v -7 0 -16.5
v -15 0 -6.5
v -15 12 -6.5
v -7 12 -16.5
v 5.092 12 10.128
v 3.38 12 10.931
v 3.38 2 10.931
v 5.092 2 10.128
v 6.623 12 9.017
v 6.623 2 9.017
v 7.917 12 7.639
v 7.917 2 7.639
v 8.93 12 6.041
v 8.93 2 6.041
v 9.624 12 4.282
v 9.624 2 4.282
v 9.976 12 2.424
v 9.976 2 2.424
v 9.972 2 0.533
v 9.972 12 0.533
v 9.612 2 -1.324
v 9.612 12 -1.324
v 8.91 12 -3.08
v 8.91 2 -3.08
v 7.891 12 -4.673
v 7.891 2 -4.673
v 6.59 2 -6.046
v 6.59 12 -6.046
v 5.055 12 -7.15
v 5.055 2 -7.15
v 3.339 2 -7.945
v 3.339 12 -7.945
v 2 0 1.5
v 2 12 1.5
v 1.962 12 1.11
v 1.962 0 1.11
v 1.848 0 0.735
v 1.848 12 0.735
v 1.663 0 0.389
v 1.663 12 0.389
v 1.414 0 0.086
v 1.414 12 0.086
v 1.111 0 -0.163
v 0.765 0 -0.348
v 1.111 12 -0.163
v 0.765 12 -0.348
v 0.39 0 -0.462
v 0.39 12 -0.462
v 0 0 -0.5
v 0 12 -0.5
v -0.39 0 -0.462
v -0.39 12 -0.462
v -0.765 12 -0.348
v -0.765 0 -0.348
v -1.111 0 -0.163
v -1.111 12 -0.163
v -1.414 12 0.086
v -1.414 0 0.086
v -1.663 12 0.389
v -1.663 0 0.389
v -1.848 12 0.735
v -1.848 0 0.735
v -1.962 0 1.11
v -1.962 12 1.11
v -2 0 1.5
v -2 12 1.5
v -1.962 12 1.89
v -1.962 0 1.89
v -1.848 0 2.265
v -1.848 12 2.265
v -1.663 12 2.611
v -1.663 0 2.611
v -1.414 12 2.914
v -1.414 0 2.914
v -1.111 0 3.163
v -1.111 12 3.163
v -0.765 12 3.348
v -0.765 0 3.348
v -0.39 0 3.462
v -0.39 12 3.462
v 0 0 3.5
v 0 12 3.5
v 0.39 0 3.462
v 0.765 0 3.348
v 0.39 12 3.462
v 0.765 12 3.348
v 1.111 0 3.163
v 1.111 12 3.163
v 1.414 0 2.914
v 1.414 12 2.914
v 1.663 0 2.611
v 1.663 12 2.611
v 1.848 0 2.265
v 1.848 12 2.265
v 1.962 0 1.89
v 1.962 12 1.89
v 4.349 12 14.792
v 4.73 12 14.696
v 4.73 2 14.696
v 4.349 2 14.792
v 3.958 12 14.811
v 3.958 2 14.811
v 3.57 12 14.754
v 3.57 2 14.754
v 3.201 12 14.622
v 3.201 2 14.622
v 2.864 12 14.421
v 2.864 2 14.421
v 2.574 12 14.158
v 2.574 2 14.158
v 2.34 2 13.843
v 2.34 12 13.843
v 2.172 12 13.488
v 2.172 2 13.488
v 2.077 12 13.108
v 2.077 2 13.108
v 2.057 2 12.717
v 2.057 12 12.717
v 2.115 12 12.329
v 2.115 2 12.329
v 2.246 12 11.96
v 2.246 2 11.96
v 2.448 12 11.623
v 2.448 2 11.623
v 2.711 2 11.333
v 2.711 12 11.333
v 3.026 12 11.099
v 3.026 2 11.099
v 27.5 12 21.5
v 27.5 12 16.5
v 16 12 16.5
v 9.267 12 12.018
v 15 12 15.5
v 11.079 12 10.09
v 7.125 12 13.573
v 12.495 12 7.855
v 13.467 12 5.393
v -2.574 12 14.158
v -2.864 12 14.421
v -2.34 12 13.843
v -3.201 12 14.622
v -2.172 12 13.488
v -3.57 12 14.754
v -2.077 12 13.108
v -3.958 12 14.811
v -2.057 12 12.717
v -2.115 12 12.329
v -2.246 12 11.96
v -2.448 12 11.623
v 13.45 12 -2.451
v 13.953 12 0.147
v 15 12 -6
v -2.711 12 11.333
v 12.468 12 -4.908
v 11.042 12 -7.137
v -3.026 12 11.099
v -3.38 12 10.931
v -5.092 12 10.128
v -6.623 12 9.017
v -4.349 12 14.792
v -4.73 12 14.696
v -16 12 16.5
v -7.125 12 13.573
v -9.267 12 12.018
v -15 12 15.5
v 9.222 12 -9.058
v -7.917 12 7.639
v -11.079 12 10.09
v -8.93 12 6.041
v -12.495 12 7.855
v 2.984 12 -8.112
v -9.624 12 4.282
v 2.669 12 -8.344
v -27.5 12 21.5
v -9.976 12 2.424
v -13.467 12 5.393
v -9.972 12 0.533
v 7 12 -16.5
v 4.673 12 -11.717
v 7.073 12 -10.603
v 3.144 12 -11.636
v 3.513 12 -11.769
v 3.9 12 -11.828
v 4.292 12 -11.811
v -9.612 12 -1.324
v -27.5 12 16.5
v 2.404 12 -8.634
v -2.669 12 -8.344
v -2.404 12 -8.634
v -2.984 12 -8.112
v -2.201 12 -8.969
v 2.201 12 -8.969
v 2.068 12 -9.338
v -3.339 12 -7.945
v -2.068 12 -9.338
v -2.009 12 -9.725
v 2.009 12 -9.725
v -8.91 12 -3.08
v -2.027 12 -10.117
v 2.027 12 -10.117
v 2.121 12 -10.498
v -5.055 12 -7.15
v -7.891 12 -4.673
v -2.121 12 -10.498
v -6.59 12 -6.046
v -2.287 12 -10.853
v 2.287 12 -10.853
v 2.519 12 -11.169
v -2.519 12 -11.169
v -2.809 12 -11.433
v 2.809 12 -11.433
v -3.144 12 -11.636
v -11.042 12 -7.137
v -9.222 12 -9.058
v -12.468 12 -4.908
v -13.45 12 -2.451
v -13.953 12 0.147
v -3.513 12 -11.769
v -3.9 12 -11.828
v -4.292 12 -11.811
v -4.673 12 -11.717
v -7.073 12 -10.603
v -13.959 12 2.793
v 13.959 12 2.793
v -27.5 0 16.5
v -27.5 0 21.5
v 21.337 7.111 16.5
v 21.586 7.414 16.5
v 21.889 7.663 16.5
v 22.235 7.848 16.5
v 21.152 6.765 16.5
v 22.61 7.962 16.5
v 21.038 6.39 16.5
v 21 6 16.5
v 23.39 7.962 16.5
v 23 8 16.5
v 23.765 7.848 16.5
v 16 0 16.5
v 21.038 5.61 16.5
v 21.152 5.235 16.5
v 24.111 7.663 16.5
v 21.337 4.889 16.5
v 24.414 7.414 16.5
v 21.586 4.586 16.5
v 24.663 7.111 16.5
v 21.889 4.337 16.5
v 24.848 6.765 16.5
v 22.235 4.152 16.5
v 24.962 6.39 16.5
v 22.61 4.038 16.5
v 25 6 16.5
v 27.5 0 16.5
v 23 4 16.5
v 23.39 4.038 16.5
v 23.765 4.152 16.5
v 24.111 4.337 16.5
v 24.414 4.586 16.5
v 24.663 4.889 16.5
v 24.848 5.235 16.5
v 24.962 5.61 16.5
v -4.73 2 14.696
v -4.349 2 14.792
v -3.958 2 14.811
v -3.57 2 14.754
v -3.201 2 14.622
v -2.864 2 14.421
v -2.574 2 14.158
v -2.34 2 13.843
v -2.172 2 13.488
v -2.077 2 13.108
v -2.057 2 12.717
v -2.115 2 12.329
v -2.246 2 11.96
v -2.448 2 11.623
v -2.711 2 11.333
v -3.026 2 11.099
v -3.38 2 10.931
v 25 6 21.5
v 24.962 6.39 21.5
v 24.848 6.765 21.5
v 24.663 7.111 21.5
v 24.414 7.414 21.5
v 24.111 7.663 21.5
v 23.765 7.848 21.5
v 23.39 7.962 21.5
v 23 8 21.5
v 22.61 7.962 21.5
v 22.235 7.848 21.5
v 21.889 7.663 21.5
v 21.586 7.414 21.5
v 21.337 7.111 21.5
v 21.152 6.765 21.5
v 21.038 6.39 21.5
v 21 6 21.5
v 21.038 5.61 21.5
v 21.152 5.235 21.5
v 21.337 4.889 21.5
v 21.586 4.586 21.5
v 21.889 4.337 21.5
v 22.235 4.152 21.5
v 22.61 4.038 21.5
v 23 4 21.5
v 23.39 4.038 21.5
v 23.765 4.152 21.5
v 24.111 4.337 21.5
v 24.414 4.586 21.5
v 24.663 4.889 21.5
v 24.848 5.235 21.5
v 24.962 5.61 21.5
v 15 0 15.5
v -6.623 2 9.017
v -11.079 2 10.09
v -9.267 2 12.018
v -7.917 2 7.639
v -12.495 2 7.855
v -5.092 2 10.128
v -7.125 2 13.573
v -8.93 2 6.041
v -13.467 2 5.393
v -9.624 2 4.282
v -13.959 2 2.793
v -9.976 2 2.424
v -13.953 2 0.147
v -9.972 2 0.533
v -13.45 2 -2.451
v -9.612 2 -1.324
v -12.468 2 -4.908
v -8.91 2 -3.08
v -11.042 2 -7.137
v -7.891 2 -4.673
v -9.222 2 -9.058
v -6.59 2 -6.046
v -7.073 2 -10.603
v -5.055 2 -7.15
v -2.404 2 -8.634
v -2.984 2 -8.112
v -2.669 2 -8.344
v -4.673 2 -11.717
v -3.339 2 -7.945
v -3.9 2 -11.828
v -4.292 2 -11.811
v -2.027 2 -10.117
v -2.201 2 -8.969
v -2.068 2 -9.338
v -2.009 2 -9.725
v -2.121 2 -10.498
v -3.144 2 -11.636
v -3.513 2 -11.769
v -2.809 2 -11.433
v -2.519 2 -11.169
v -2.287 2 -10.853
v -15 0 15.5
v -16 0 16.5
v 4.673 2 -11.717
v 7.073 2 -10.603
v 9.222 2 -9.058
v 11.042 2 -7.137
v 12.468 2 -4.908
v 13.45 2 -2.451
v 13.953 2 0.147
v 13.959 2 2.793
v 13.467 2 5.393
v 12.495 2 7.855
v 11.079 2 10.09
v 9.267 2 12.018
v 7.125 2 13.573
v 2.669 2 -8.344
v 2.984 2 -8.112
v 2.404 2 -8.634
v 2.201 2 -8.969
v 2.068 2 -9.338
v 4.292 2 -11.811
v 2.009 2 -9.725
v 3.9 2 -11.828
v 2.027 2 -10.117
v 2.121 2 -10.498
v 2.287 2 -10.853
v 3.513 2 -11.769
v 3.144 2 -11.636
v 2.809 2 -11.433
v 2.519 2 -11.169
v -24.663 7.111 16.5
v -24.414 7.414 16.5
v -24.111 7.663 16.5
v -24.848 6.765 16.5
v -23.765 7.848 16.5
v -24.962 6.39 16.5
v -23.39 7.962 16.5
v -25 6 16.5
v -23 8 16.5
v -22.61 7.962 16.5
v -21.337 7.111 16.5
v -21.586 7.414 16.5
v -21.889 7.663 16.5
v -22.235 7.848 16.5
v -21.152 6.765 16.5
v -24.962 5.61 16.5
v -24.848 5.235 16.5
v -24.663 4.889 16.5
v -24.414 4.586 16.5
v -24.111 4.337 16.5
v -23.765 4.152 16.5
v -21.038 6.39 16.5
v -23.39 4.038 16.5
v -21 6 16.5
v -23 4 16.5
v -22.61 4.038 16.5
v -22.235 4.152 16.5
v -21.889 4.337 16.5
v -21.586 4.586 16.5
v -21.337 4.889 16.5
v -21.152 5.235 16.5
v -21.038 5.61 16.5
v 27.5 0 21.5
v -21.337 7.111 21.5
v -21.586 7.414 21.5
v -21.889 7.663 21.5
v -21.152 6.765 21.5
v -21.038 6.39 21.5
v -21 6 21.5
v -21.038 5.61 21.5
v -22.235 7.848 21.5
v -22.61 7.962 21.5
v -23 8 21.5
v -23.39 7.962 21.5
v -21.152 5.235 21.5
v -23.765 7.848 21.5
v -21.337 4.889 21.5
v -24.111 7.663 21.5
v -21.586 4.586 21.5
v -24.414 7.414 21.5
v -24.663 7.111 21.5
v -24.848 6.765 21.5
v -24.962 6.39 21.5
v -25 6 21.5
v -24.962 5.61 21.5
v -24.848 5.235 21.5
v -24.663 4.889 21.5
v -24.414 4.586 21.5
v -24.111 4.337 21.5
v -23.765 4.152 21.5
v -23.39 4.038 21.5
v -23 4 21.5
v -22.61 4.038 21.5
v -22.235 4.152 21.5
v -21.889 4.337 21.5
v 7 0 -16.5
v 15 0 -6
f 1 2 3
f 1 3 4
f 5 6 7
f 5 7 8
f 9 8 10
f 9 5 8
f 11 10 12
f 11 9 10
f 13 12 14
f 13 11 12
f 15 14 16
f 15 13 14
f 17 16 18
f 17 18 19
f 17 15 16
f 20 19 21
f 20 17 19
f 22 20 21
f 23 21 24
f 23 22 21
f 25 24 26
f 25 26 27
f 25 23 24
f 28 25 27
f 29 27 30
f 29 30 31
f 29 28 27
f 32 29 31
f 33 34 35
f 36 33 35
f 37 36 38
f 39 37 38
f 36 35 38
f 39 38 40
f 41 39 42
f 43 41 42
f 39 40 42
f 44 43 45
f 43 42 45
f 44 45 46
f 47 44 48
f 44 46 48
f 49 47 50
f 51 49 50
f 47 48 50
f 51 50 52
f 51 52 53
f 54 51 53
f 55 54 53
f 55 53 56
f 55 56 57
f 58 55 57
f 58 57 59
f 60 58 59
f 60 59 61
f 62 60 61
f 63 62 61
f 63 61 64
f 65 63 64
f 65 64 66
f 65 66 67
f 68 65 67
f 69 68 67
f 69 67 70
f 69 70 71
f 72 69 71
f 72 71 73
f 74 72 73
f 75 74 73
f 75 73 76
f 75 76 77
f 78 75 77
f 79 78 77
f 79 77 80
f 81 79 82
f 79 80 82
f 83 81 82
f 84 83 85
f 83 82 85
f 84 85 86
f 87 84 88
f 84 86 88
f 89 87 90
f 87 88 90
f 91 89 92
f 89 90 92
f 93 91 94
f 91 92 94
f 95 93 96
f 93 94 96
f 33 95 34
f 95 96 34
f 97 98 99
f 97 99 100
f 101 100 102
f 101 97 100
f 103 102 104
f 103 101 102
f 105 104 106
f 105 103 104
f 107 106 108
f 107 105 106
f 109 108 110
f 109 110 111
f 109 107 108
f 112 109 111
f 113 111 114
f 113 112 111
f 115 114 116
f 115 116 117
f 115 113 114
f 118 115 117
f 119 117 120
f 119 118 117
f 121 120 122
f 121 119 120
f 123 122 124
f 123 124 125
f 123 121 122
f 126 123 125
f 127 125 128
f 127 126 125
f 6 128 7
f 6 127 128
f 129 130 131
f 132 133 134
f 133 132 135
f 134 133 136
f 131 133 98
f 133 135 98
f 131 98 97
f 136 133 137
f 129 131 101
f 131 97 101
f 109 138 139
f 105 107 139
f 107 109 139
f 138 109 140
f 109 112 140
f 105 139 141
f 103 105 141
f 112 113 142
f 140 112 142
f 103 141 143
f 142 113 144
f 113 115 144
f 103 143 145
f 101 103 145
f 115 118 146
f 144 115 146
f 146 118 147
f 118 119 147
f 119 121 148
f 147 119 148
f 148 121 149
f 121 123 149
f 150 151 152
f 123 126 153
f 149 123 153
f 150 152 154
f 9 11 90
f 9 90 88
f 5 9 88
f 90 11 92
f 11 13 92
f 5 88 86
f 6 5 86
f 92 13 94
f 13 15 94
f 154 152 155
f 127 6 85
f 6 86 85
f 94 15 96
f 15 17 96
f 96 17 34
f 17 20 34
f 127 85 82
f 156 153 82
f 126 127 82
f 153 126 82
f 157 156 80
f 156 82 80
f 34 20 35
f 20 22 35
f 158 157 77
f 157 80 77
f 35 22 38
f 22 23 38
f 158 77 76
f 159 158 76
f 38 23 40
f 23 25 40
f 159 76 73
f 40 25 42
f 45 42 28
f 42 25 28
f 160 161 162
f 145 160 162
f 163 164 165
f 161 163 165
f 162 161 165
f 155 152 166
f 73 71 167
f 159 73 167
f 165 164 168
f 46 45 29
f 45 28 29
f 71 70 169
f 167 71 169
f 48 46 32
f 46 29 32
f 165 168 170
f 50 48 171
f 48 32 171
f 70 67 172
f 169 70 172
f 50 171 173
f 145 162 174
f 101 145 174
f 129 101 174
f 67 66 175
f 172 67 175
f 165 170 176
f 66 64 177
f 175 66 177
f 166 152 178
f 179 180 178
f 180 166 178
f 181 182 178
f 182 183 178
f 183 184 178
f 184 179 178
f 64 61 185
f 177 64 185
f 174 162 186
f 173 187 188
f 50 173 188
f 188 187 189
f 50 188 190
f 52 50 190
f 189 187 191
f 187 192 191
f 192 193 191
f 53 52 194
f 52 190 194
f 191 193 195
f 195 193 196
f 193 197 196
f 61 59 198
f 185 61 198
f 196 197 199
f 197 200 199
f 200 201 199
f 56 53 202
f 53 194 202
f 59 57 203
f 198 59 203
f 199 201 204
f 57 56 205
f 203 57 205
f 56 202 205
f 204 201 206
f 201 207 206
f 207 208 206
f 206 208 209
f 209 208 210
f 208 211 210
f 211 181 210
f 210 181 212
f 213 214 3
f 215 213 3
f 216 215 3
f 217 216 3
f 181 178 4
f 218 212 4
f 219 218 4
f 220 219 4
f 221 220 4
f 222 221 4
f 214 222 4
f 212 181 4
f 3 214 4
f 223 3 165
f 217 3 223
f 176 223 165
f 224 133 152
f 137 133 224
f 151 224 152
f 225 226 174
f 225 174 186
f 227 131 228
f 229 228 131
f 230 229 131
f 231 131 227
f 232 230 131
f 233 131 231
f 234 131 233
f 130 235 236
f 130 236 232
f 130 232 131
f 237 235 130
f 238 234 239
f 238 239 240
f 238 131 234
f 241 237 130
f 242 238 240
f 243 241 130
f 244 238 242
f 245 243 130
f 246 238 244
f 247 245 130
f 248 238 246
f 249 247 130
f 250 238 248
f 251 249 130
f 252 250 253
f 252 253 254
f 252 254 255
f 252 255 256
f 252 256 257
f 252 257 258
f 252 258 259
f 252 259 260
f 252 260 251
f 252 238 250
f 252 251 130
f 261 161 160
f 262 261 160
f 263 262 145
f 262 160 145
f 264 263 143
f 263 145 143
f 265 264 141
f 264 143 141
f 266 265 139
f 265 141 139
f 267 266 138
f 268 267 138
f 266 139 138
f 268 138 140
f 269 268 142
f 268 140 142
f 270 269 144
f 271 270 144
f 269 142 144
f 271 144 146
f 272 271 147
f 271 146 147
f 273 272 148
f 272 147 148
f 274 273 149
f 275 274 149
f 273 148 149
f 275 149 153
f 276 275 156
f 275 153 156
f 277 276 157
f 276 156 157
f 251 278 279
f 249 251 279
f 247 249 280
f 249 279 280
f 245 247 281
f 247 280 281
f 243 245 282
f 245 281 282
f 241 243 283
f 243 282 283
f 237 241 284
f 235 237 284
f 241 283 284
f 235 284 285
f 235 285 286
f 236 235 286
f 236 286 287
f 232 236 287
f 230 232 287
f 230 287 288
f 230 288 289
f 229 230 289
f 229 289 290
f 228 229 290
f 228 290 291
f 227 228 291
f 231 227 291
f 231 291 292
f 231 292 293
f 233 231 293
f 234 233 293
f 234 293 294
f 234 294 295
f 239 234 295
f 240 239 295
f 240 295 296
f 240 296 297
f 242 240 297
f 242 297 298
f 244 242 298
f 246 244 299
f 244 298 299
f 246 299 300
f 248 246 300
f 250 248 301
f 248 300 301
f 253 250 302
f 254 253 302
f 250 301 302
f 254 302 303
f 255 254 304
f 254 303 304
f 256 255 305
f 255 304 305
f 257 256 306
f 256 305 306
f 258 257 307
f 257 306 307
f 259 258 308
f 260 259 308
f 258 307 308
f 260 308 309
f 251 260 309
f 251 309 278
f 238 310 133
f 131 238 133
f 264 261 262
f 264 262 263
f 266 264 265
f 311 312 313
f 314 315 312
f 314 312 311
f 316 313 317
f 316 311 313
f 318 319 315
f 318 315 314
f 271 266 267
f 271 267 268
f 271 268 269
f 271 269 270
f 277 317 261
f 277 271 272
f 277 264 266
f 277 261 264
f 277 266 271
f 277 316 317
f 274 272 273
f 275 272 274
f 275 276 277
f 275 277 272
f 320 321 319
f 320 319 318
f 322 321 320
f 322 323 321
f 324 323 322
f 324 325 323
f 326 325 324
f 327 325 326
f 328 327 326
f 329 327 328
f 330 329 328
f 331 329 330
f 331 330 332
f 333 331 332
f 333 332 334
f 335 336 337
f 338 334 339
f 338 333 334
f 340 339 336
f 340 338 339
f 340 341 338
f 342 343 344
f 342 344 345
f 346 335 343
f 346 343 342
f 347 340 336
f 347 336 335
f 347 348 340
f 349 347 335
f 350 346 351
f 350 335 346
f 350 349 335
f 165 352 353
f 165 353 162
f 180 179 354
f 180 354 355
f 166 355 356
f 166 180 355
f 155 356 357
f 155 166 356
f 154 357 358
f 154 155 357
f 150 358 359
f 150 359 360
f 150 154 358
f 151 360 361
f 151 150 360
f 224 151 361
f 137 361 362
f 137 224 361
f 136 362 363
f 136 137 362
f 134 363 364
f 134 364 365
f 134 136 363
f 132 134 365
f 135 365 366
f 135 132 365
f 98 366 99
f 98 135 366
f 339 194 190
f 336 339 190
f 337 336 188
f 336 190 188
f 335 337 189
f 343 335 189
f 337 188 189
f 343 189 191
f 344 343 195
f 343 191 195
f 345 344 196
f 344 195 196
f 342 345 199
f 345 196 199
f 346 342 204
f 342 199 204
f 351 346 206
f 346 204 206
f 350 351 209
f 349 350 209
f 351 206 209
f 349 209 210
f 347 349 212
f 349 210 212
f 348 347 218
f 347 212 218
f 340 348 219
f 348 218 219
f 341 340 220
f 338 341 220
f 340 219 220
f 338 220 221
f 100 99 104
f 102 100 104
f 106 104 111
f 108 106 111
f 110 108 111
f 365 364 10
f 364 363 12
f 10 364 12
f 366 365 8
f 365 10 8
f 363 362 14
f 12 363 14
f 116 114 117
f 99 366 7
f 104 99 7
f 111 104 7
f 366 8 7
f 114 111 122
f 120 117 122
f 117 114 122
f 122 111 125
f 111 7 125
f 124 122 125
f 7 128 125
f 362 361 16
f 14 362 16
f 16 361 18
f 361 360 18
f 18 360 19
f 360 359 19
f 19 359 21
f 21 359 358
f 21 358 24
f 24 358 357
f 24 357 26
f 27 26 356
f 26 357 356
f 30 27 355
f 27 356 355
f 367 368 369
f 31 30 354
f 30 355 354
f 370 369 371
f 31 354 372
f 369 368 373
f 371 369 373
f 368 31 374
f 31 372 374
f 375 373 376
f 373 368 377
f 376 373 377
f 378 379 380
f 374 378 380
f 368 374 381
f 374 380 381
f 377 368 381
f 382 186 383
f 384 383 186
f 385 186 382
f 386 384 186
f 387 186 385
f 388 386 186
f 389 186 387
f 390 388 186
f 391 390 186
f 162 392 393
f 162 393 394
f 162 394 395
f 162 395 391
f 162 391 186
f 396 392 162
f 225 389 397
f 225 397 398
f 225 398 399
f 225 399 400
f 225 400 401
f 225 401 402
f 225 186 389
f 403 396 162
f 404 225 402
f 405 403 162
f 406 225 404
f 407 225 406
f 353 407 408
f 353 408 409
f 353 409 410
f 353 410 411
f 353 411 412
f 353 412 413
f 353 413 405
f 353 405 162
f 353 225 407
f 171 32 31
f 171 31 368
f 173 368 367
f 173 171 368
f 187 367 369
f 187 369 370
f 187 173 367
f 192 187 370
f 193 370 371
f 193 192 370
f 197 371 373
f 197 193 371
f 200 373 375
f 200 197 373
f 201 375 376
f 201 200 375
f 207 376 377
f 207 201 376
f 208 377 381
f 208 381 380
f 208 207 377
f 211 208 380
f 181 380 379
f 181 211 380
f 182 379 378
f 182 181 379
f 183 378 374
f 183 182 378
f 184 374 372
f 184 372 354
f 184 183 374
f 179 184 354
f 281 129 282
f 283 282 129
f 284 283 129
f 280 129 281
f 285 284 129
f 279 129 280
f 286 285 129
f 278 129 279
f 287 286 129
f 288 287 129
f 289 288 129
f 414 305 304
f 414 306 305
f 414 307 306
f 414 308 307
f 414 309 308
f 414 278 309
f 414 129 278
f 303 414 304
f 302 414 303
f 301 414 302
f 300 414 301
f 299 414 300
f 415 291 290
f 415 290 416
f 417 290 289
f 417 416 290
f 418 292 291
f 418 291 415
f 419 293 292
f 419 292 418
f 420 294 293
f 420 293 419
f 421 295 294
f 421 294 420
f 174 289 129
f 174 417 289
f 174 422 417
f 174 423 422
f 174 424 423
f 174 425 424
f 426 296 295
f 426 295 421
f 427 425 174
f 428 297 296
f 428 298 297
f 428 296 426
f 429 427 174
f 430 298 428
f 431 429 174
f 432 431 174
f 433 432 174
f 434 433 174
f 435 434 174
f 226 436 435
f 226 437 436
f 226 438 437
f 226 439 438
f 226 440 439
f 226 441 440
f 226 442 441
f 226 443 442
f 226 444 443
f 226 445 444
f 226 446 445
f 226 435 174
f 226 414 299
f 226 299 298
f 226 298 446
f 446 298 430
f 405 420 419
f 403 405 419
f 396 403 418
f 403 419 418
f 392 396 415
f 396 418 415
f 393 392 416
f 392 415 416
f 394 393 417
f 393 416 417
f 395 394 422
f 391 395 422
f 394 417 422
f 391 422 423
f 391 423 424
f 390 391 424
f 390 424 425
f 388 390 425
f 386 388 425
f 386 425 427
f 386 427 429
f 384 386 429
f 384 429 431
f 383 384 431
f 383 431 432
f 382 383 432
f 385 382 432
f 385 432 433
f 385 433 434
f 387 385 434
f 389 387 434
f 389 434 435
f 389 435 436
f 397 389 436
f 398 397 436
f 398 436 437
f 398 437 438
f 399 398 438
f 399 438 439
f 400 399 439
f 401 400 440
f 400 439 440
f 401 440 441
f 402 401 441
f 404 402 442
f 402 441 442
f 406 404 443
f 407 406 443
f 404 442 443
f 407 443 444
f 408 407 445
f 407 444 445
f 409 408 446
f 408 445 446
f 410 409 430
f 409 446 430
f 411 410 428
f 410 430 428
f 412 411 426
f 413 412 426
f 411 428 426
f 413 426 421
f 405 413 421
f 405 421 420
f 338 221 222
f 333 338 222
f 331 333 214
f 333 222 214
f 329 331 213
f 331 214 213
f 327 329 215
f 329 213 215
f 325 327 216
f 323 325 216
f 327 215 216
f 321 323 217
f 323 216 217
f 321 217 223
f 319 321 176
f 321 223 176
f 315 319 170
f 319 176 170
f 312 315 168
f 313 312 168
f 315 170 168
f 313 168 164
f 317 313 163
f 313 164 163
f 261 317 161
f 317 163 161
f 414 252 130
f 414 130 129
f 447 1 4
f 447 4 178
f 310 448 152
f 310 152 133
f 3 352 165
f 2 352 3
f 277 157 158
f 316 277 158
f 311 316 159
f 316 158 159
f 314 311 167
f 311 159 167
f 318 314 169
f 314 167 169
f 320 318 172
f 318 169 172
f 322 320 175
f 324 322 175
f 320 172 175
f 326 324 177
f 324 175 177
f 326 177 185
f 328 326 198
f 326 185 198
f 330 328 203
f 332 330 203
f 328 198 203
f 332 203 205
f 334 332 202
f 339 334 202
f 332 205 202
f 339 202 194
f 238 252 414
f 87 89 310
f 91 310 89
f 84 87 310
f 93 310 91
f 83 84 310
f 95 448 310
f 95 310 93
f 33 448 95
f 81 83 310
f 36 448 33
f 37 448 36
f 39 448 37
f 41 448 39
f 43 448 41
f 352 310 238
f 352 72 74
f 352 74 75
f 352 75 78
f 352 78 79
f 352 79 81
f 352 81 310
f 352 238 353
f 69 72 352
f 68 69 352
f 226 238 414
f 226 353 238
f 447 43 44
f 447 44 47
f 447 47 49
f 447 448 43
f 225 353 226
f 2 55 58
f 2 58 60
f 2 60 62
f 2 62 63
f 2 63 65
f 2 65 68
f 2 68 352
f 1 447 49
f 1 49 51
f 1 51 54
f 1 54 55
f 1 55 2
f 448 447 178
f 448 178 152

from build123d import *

# Parameters (mm, degrees)
BOSS_EXTRUDE1_DEPTH = 12
SKETCH2_R           = 2
CUT_EXTRUDE1_DEPTH  = 49.41745553
CUT_EXTRUDE2_DEPTH  = 10
CUT_EXTRUDE3_DEPTH  = 37.912057651
CHAMFER1_SIZE       = 1


with BuildPart() as part:
    # Sketch1 → Boss-Extrude1 (new body)
    with BuildSketch(Plane(origin=(0, 0, 0), x_dir=(1, 0, 0), z_dir=(0, 1, 0))):
        Polygon((15, -16.5), (27.5, -16.5), (27.5, -21.5), (-27.5, -21.5), (-27.5, -16.5), (-15, -16.5), (-15, 6.5), (-7, 16.5), (7, 16.5), (15, 6), align=None)
    extrude(amount=BOSS_EXTRUDE1_DEPTH)

    # Sketch2 → Cut-Extrude1 (cut, through all)
    with BuildSketch(Plane.XY.offset(21.5)):
        with Locations((-23, 6)):
            Circle(SKETCH2_R)
        with Locations((23, 6)):
            Circle(SKETCH2_R)
    extrude(amount=-CUT_EXTRUDE1_DEPTH, mode=Mode.SUBTRACT)

    # Sketch3 → Cut-Extrude2 (cut)
    with BuildSketch(Plane(origin=(0, 12, 0), x_dir=(1, 0, 0), z_dir=(0, 1, 0))):
        with BuildLine():
            ThreePointArc((-3.339472326, 7.945454111), (-2.12052091, 10.49773886), (-4.67280566, 11.716690277))
            ThreePointArc((-4.67280566, 11.716690277), (-14.018384458, -1.469804084), (-4.729700131, -14.696437068))
            ThreePointArc((-4.729700131, -14.696437068), (-2.172187792, -13.488492269), (-3.380132591, -10.93097993))
            ThreePointArc((-3.380132591, -10.93097993), (-10.018393738, -1.478420154), (-3.339472326, 7.945454111))
        make_face()
        with BuildLine():
            ThreePointArc((4.729700131, -14.696437068), (14.018384458, -1.469804084), (4.67280566, 11.716690277))
            ThreePointArc((4.67280566, 11.716690277), (2.12052091, 10.49773886), (3.339472326, 7.945454111))
            ThreePointArc((3.339472326, 7.945454111), (10.018393738, -1.478420154), (3.380132591, -10.93097993))
            ThreePointArc((3.380132591, -10.93097993), (2.172187792, -13.488492269), (4.729700131, -14.696437068))
        make_face()
    extrude(amount=-CUT_EXTRUDE2_DEPTH, mode=Mode.SUBTRACT)

    # Sketch3<7> → Cut-Extrude3 (cut, through all)
    with BuildSketch(Plane(origin=(0, 12, 0), x_dir=(1, 0, 0), z_dir=(0, 1, 0))):
        with BuildLine():
            ThreePointArc((0, 0.5), (-1.414213562, -2.914213562), (2, -1.5))
            ThreePointArc((2, -1.5), (1.414213562, -0.085786438), (0, 0.5))
        make_face()
    extrude(amount=-CUT_EXTRUDE3_DEPTH, mode=Mode.SUBTRACT)

    # Chamfer1
    chamfer1_edges = [part.edges().sort_by_distance(p)[0] for p in [
        (-15, 6, 16.5),
        (15, 6, 16.5),
    ]]
    chamfer(chamfer1_edges, length=CHAMFER1_SIZE)


solid = part.part
